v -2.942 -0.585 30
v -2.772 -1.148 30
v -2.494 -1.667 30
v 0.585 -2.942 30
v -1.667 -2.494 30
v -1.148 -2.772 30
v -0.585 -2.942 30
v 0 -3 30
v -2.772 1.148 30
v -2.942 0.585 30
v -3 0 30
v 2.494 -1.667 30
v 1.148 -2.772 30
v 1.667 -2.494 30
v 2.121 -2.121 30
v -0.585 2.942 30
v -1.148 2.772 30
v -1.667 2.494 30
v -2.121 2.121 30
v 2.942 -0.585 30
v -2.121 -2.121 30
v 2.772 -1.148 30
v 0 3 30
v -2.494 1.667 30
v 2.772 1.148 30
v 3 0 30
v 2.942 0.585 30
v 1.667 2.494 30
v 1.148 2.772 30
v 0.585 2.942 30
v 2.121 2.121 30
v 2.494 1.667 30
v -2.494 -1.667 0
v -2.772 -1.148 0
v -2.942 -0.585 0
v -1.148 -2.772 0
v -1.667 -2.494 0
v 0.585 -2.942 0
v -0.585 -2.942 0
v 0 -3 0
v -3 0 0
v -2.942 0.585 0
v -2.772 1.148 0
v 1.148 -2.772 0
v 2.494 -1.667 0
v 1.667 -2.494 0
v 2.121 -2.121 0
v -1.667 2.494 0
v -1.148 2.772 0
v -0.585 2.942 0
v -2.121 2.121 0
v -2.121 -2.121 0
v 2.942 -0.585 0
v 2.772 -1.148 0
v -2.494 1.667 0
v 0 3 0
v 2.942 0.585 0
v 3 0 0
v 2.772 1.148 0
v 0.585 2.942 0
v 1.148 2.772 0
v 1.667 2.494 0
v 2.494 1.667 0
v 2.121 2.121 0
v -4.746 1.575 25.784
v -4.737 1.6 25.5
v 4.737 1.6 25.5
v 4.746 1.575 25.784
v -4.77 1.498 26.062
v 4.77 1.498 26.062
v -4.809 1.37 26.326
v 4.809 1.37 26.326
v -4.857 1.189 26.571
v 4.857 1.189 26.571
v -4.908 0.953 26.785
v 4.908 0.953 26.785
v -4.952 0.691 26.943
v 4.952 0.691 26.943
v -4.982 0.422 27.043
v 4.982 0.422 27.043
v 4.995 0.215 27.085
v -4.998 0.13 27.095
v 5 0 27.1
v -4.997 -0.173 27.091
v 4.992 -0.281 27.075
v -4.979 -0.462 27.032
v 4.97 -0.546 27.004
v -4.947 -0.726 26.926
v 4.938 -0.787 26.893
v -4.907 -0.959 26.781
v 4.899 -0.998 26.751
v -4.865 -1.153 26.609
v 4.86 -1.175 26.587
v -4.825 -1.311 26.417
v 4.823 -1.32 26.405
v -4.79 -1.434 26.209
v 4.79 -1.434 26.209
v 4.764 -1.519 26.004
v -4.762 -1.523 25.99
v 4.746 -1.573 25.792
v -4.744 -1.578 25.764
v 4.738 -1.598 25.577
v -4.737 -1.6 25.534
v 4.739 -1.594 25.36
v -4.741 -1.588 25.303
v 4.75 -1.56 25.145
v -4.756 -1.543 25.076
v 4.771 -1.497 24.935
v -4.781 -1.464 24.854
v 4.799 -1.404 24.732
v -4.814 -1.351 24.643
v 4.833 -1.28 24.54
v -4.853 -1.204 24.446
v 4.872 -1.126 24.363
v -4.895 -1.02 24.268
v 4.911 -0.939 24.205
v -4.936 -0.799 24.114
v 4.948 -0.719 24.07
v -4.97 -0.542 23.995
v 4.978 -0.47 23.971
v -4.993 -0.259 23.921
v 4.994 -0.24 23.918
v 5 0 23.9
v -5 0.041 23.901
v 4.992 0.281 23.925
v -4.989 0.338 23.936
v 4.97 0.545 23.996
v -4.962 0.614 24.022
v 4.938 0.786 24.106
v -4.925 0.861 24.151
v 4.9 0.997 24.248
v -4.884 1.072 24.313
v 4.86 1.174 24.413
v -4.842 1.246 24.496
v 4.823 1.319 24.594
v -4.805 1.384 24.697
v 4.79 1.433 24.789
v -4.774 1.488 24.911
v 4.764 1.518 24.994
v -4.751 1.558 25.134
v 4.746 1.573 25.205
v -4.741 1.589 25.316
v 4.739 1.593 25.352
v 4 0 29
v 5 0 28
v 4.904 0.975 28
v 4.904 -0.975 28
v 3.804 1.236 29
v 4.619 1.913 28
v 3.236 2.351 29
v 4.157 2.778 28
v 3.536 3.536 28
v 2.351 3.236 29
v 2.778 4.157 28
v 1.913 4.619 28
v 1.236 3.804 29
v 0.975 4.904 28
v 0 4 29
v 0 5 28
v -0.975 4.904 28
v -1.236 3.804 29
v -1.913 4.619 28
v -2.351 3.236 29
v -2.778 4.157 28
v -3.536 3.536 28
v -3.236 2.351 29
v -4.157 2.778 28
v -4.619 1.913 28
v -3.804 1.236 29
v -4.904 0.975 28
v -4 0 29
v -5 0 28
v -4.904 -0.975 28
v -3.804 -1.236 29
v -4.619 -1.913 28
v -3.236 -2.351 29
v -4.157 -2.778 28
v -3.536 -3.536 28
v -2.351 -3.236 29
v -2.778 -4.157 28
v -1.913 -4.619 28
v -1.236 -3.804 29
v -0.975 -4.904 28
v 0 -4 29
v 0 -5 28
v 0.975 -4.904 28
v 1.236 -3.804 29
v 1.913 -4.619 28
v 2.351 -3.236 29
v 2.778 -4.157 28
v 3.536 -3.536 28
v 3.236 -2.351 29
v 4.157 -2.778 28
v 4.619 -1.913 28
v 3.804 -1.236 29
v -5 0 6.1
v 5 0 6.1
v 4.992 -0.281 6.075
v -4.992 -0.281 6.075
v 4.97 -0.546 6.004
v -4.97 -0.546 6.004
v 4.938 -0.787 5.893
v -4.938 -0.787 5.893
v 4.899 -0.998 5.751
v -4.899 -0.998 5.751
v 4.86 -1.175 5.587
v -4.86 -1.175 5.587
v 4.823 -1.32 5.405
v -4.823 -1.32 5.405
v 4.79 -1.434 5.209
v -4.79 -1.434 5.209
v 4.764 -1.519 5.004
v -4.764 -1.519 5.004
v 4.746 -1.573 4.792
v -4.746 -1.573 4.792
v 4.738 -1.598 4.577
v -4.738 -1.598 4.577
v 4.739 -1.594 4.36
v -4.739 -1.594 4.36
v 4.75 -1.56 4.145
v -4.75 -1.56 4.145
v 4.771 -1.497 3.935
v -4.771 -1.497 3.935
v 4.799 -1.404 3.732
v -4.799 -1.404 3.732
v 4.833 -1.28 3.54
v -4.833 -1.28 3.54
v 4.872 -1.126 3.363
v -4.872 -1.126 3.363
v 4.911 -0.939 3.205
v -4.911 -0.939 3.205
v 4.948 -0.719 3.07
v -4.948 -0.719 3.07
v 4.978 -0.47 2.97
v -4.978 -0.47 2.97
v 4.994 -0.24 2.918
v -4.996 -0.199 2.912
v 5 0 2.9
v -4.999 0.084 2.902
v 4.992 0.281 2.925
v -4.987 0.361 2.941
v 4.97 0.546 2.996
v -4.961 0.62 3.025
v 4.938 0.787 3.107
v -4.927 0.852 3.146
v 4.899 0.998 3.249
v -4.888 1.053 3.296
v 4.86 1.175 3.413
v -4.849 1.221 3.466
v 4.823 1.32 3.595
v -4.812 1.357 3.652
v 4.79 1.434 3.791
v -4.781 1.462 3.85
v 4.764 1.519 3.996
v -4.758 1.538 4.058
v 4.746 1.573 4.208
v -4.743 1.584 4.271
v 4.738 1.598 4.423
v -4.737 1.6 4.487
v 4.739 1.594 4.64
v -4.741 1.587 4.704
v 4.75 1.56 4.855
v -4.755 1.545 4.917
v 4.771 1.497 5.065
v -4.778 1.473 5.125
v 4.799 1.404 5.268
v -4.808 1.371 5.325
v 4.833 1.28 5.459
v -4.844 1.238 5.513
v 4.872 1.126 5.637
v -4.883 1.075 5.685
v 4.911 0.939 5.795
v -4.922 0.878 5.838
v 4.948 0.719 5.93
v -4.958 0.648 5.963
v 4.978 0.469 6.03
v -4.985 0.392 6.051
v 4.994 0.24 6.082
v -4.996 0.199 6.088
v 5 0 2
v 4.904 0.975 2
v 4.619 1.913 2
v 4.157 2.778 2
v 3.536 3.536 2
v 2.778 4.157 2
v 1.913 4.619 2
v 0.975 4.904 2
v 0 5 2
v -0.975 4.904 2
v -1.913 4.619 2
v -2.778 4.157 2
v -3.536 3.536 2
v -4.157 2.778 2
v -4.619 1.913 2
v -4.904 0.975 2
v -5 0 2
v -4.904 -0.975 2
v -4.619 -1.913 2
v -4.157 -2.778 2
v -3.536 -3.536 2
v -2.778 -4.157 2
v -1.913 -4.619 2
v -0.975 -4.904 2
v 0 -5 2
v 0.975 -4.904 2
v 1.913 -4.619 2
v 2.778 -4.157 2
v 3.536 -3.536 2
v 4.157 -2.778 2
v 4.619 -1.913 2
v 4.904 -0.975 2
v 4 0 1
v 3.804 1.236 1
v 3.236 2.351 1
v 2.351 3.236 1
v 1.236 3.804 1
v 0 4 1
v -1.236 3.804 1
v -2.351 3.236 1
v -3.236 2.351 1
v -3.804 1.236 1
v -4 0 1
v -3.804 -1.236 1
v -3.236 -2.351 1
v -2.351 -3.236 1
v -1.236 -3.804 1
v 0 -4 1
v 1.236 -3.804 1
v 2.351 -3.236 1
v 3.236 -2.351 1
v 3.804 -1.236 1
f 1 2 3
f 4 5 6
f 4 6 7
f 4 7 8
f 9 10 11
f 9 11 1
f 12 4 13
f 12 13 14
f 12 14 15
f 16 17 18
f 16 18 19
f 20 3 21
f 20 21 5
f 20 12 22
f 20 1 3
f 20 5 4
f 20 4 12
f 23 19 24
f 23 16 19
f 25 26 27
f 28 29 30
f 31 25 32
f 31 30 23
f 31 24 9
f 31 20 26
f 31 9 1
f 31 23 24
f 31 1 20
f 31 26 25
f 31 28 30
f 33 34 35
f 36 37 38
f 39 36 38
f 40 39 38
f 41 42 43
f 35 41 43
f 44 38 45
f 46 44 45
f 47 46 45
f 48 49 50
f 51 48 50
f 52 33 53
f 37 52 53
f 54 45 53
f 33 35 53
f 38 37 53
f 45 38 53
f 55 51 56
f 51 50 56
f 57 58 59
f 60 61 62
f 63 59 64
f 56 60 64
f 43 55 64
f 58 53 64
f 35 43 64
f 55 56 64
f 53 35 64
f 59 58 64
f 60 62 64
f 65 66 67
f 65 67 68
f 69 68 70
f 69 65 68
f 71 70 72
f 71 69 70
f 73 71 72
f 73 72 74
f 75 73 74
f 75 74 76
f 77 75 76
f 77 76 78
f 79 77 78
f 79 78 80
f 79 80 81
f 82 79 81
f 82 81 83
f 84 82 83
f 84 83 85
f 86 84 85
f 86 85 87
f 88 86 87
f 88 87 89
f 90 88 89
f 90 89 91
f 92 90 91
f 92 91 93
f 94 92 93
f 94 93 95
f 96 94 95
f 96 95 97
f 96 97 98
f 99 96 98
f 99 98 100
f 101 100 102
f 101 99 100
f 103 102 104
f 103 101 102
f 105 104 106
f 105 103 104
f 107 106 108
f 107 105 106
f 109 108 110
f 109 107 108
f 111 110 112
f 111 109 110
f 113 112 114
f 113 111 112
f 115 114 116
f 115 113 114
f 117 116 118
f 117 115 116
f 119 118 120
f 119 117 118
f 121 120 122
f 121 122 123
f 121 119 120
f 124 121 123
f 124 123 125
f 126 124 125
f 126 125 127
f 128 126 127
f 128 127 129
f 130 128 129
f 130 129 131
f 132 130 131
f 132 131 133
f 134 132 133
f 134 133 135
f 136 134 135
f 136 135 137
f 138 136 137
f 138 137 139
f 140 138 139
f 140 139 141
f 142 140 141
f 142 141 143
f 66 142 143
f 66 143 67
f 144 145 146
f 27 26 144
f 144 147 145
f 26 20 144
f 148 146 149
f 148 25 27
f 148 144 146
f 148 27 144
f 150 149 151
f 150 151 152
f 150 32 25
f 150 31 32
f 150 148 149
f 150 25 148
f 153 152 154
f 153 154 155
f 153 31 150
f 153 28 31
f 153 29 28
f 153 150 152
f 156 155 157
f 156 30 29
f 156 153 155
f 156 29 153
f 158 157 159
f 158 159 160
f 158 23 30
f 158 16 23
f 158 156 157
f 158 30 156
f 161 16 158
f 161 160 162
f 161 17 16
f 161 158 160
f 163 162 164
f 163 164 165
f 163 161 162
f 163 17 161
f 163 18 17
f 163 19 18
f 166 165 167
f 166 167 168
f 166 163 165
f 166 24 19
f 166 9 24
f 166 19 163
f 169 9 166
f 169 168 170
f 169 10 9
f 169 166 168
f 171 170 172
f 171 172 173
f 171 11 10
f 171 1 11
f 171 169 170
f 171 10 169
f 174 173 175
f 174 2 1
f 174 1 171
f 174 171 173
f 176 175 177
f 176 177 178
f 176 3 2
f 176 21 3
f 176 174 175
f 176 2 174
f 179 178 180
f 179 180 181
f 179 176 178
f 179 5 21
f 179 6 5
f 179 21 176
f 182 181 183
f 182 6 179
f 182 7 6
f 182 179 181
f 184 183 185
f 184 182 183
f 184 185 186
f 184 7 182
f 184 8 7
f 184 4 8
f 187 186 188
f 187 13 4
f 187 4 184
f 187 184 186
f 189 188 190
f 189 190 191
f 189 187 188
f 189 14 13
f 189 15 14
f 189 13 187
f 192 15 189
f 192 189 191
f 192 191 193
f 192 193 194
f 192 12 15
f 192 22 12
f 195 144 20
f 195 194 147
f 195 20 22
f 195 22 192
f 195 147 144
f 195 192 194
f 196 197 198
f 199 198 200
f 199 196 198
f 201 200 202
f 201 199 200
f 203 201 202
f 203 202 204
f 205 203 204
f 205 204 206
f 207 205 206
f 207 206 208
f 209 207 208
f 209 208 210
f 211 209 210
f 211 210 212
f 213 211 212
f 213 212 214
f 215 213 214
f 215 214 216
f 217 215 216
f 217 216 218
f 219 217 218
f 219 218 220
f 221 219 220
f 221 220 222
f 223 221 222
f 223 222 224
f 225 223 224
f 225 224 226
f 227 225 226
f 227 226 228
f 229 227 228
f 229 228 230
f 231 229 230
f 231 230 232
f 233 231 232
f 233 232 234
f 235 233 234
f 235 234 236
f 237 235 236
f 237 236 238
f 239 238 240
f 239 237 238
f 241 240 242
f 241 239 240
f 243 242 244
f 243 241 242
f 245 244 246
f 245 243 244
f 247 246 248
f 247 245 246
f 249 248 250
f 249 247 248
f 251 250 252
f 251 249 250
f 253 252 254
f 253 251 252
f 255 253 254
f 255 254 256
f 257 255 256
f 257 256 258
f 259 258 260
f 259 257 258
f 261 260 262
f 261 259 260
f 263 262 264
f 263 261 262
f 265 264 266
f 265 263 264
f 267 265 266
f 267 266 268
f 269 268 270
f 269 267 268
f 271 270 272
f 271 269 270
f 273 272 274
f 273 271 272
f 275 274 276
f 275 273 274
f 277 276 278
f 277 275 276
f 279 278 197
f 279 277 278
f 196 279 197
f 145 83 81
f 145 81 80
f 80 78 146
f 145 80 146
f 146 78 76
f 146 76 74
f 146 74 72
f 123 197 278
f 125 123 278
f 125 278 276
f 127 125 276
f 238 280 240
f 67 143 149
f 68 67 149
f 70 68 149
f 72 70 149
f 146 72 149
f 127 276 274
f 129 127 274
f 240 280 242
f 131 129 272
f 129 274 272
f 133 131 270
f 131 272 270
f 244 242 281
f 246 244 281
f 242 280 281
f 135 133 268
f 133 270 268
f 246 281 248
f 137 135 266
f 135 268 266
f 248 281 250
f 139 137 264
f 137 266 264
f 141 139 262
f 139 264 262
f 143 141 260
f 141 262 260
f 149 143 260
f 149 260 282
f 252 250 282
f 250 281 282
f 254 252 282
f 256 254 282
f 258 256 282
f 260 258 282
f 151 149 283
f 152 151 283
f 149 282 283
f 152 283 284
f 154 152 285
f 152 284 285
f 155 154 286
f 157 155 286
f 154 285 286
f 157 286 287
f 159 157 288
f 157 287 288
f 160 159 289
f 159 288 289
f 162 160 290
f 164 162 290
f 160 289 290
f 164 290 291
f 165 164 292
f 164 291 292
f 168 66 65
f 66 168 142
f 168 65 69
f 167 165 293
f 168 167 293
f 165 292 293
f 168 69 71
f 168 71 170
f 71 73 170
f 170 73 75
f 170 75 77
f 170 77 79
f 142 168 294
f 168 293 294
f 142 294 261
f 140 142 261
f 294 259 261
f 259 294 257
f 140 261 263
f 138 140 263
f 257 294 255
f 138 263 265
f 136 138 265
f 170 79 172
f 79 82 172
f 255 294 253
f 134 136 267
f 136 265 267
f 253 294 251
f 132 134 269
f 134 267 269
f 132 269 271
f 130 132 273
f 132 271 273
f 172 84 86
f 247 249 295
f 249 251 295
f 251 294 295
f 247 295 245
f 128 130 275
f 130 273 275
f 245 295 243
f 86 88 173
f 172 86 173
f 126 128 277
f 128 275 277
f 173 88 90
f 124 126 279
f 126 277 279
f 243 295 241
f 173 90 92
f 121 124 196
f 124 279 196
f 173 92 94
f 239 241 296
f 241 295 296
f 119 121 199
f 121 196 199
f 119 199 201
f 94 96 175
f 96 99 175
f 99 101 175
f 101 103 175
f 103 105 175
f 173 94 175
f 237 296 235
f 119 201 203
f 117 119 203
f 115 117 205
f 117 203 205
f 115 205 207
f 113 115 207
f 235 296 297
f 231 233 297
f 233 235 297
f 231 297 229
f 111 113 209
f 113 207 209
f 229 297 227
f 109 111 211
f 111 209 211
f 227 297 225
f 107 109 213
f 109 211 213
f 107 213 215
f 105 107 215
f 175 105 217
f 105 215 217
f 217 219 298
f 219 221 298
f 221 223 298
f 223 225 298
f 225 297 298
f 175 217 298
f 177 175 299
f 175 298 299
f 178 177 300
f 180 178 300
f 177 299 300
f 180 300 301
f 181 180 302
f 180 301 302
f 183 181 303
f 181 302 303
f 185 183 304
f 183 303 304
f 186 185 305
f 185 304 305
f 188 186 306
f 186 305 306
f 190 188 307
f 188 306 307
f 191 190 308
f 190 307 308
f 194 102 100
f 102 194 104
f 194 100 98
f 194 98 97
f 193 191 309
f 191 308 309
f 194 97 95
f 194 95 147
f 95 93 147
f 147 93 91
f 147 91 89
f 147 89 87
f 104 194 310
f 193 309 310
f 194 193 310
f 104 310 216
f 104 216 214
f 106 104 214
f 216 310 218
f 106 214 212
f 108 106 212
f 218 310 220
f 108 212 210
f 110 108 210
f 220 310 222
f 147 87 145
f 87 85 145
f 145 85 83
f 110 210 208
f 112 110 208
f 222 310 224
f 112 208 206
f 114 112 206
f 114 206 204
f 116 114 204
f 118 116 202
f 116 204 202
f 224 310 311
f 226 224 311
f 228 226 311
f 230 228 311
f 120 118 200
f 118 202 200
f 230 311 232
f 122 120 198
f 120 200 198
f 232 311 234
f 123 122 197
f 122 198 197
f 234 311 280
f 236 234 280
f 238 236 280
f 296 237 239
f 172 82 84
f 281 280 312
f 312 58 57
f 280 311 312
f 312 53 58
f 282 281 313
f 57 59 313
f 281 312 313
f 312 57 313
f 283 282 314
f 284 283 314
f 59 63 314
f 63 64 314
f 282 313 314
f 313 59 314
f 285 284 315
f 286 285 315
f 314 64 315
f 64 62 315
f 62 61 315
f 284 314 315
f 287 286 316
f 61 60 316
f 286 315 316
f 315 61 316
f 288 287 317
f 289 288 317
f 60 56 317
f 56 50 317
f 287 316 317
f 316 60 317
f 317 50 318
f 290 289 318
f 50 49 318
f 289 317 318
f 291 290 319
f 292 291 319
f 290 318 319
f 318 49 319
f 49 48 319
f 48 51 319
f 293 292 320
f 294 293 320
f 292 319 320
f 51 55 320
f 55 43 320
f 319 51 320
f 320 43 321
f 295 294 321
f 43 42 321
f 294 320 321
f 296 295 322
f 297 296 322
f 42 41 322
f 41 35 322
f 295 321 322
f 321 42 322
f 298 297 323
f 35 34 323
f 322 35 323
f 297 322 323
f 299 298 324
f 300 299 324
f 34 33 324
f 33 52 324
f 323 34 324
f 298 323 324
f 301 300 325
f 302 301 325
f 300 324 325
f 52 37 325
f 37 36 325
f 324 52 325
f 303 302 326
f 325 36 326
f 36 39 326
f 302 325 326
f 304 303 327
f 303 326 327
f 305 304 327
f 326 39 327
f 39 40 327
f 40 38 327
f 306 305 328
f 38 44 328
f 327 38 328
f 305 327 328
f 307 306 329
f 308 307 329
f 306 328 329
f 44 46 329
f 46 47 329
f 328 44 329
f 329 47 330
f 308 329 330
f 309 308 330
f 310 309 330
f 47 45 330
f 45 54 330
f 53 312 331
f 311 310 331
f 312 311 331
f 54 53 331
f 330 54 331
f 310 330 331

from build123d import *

# Parameters (mm, degrees)
SKETCH1_R               = 5
BASE_EXTRUDE_DEPTH      = 30
CHAMFER1_SIZE           = 2
CUT_EXTRUDE1_DEPTH      = 22.213203436
CUT_EXTRUDE1_DEPTH_BACK = 22.213203436
SKETCH2_R               = 1.6


with BuildPart() as part:
    # Sketch1 → Base-Extrude (new body)
    with BuildSketch(Plane.XY):
        Circle(SKETCH1_R)
    extrude(amount=BASE_EXTRUDE_DEPTH)

    # Chamfer1
    chamfer1_edges = [part.edges().sort_by_distance(p)[0] for p in [
        (-5, 0, 0),
        (-5, 0, 30),
    ]]
    chamfer(chamfer1_edges, length=CHAMFER1_SIZE)

    # Sketch2 → Cut-Extrude1 (cut, two sides: drawn at the far end of the back side and taken through both)
    with BuildSketch(Plane(origin=(0, 0, 10), x_dir=(0, -1, 0), z_dir=(1, 0, 0)).offset(-CUT_EXTRUDE1_DEPTH_BACK)):
        with Locations(Location((0, 5.5, 0), (0, 0, 269.99999999))):
            Circle(SKETCH2_R)
        with Locations(Location((0, -15.5, 0), (0, 0, 180))):
            Circle(SKETCH2_R)
    extrude(amount=CUT_EXTRUDE1_DEPTH + CUT_EXTRUDE1_DEPTH_BACK, mode=Mode.SUBTRACT)


solid = part.part
